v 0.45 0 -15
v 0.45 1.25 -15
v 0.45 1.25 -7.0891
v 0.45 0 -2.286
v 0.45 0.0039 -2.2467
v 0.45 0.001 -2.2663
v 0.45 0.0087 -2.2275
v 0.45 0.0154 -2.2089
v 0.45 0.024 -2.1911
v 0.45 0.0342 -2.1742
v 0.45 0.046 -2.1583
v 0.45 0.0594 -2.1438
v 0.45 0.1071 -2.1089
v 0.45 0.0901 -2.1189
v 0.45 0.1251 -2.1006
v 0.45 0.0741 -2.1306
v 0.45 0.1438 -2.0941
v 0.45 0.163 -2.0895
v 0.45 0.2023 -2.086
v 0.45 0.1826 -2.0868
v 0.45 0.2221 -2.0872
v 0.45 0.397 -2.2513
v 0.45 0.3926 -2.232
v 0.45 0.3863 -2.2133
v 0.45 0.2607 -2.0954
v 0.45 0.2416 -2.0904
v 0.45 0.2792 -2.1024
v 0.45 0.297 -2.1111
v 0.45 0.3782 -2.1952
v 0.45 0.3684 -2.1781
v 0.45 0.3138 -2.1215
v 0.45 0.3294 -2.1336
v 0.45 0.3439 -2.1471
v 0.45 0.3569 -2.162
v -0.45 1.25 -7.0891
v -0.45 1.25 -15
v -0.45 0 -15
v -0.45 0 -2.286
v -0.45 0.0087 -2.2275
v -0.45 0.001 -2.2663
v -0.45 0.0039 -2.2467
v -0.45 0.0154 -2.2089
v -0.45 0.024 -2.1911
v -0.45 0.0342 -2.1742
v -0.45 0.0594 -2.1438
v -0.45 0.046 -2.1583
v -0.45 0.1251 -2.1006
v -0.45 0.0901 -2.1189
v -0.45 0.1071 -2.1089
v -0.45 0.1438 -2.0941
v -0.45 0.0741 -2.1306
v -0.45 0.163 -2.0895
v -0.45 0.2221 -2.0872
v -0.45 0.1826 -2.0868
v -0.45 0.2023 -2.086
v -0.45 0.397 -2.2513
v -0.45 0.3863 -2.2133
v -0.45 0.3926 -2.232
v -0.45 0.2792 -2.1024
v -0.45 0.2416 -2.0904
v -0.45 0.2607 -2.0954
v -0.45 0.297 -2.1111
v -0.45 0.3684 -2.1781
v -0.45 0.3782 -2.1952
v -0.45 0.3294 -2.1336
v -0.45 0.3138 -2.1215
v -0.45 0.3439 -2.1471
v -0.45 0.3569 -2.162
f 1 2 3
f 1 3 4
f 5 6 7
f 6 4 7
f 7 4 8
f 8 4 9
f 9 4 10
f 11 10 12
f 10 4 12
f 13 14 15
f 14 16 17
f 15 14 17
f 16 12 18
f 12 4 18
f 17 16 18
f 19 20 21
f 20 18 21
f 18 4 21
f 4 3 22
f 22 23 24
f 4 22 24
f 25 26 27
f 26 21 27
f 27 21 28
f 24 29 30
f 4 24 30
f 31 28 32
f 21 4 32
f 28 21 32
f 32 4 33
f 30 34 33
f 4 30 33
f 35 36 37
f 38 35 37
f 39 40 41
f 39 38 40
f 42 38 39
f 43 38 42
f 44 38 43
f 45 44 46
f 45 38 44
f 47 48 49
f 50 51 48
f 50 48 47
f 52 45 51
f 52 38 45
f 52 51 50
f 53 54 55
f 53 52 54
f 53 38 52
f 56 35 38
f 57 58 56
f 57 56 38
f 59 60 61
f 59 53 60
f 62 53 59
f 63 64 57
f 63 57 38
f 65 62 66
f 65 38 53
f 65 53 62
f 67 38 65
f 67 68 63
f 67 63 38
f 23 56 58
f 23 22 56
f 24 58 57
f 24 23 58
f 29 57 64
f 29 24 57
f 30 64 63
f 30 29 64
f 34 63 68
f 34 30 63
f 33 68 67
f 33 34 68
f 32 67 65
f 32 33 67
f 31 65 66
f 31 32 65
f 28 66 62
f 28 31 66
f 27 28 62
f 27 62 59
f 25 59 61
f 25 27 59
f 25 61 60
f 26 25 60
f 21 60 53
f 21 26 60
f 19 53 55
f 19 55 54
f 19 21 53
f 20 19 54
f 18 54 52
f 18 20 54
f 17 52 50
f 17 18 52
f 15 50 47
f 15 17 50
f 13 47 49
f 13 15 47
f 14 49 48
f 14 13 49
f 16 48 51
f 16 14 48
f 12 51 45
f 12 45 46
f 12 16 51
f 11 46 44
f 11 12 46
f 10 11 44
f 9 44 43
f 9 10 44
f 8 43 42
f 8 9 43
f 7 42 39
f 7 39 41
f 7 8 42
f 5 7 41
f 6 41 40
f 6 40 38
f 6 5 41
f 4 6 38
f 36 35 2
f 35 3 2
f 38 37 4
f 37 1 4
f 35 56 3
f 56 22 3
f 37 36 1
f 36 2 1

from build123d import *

# Parameters (mm, degrees)
BOSS_EXTRUDE1_DEPTH = 0.45
FILLET1_R           = 0.2


with BuildPart() as part:
    # Sketch1 → Boss-Extrude1 (new, symmetric)
    with BuildSketch(Plane(origin=(0, 0, 0), x_dir=(0, 0, -1), z_dir=(1, 0, 0))):
        Polygon((0, 0), (7.089102275, 1.25), (15, 1.25), (15, 0), align=None)
    extrude(amount=BOSS_EXTRUDE1_DEPTH, both=True)

    # Fillet1
    fillet1_edges = [part.edges().sort_by_distance(p)[0] for p in [
        (0, 0, 0),
    ]]
    fillet(fillet1_edges, radius=FILLET1_R)


solid = part.part
